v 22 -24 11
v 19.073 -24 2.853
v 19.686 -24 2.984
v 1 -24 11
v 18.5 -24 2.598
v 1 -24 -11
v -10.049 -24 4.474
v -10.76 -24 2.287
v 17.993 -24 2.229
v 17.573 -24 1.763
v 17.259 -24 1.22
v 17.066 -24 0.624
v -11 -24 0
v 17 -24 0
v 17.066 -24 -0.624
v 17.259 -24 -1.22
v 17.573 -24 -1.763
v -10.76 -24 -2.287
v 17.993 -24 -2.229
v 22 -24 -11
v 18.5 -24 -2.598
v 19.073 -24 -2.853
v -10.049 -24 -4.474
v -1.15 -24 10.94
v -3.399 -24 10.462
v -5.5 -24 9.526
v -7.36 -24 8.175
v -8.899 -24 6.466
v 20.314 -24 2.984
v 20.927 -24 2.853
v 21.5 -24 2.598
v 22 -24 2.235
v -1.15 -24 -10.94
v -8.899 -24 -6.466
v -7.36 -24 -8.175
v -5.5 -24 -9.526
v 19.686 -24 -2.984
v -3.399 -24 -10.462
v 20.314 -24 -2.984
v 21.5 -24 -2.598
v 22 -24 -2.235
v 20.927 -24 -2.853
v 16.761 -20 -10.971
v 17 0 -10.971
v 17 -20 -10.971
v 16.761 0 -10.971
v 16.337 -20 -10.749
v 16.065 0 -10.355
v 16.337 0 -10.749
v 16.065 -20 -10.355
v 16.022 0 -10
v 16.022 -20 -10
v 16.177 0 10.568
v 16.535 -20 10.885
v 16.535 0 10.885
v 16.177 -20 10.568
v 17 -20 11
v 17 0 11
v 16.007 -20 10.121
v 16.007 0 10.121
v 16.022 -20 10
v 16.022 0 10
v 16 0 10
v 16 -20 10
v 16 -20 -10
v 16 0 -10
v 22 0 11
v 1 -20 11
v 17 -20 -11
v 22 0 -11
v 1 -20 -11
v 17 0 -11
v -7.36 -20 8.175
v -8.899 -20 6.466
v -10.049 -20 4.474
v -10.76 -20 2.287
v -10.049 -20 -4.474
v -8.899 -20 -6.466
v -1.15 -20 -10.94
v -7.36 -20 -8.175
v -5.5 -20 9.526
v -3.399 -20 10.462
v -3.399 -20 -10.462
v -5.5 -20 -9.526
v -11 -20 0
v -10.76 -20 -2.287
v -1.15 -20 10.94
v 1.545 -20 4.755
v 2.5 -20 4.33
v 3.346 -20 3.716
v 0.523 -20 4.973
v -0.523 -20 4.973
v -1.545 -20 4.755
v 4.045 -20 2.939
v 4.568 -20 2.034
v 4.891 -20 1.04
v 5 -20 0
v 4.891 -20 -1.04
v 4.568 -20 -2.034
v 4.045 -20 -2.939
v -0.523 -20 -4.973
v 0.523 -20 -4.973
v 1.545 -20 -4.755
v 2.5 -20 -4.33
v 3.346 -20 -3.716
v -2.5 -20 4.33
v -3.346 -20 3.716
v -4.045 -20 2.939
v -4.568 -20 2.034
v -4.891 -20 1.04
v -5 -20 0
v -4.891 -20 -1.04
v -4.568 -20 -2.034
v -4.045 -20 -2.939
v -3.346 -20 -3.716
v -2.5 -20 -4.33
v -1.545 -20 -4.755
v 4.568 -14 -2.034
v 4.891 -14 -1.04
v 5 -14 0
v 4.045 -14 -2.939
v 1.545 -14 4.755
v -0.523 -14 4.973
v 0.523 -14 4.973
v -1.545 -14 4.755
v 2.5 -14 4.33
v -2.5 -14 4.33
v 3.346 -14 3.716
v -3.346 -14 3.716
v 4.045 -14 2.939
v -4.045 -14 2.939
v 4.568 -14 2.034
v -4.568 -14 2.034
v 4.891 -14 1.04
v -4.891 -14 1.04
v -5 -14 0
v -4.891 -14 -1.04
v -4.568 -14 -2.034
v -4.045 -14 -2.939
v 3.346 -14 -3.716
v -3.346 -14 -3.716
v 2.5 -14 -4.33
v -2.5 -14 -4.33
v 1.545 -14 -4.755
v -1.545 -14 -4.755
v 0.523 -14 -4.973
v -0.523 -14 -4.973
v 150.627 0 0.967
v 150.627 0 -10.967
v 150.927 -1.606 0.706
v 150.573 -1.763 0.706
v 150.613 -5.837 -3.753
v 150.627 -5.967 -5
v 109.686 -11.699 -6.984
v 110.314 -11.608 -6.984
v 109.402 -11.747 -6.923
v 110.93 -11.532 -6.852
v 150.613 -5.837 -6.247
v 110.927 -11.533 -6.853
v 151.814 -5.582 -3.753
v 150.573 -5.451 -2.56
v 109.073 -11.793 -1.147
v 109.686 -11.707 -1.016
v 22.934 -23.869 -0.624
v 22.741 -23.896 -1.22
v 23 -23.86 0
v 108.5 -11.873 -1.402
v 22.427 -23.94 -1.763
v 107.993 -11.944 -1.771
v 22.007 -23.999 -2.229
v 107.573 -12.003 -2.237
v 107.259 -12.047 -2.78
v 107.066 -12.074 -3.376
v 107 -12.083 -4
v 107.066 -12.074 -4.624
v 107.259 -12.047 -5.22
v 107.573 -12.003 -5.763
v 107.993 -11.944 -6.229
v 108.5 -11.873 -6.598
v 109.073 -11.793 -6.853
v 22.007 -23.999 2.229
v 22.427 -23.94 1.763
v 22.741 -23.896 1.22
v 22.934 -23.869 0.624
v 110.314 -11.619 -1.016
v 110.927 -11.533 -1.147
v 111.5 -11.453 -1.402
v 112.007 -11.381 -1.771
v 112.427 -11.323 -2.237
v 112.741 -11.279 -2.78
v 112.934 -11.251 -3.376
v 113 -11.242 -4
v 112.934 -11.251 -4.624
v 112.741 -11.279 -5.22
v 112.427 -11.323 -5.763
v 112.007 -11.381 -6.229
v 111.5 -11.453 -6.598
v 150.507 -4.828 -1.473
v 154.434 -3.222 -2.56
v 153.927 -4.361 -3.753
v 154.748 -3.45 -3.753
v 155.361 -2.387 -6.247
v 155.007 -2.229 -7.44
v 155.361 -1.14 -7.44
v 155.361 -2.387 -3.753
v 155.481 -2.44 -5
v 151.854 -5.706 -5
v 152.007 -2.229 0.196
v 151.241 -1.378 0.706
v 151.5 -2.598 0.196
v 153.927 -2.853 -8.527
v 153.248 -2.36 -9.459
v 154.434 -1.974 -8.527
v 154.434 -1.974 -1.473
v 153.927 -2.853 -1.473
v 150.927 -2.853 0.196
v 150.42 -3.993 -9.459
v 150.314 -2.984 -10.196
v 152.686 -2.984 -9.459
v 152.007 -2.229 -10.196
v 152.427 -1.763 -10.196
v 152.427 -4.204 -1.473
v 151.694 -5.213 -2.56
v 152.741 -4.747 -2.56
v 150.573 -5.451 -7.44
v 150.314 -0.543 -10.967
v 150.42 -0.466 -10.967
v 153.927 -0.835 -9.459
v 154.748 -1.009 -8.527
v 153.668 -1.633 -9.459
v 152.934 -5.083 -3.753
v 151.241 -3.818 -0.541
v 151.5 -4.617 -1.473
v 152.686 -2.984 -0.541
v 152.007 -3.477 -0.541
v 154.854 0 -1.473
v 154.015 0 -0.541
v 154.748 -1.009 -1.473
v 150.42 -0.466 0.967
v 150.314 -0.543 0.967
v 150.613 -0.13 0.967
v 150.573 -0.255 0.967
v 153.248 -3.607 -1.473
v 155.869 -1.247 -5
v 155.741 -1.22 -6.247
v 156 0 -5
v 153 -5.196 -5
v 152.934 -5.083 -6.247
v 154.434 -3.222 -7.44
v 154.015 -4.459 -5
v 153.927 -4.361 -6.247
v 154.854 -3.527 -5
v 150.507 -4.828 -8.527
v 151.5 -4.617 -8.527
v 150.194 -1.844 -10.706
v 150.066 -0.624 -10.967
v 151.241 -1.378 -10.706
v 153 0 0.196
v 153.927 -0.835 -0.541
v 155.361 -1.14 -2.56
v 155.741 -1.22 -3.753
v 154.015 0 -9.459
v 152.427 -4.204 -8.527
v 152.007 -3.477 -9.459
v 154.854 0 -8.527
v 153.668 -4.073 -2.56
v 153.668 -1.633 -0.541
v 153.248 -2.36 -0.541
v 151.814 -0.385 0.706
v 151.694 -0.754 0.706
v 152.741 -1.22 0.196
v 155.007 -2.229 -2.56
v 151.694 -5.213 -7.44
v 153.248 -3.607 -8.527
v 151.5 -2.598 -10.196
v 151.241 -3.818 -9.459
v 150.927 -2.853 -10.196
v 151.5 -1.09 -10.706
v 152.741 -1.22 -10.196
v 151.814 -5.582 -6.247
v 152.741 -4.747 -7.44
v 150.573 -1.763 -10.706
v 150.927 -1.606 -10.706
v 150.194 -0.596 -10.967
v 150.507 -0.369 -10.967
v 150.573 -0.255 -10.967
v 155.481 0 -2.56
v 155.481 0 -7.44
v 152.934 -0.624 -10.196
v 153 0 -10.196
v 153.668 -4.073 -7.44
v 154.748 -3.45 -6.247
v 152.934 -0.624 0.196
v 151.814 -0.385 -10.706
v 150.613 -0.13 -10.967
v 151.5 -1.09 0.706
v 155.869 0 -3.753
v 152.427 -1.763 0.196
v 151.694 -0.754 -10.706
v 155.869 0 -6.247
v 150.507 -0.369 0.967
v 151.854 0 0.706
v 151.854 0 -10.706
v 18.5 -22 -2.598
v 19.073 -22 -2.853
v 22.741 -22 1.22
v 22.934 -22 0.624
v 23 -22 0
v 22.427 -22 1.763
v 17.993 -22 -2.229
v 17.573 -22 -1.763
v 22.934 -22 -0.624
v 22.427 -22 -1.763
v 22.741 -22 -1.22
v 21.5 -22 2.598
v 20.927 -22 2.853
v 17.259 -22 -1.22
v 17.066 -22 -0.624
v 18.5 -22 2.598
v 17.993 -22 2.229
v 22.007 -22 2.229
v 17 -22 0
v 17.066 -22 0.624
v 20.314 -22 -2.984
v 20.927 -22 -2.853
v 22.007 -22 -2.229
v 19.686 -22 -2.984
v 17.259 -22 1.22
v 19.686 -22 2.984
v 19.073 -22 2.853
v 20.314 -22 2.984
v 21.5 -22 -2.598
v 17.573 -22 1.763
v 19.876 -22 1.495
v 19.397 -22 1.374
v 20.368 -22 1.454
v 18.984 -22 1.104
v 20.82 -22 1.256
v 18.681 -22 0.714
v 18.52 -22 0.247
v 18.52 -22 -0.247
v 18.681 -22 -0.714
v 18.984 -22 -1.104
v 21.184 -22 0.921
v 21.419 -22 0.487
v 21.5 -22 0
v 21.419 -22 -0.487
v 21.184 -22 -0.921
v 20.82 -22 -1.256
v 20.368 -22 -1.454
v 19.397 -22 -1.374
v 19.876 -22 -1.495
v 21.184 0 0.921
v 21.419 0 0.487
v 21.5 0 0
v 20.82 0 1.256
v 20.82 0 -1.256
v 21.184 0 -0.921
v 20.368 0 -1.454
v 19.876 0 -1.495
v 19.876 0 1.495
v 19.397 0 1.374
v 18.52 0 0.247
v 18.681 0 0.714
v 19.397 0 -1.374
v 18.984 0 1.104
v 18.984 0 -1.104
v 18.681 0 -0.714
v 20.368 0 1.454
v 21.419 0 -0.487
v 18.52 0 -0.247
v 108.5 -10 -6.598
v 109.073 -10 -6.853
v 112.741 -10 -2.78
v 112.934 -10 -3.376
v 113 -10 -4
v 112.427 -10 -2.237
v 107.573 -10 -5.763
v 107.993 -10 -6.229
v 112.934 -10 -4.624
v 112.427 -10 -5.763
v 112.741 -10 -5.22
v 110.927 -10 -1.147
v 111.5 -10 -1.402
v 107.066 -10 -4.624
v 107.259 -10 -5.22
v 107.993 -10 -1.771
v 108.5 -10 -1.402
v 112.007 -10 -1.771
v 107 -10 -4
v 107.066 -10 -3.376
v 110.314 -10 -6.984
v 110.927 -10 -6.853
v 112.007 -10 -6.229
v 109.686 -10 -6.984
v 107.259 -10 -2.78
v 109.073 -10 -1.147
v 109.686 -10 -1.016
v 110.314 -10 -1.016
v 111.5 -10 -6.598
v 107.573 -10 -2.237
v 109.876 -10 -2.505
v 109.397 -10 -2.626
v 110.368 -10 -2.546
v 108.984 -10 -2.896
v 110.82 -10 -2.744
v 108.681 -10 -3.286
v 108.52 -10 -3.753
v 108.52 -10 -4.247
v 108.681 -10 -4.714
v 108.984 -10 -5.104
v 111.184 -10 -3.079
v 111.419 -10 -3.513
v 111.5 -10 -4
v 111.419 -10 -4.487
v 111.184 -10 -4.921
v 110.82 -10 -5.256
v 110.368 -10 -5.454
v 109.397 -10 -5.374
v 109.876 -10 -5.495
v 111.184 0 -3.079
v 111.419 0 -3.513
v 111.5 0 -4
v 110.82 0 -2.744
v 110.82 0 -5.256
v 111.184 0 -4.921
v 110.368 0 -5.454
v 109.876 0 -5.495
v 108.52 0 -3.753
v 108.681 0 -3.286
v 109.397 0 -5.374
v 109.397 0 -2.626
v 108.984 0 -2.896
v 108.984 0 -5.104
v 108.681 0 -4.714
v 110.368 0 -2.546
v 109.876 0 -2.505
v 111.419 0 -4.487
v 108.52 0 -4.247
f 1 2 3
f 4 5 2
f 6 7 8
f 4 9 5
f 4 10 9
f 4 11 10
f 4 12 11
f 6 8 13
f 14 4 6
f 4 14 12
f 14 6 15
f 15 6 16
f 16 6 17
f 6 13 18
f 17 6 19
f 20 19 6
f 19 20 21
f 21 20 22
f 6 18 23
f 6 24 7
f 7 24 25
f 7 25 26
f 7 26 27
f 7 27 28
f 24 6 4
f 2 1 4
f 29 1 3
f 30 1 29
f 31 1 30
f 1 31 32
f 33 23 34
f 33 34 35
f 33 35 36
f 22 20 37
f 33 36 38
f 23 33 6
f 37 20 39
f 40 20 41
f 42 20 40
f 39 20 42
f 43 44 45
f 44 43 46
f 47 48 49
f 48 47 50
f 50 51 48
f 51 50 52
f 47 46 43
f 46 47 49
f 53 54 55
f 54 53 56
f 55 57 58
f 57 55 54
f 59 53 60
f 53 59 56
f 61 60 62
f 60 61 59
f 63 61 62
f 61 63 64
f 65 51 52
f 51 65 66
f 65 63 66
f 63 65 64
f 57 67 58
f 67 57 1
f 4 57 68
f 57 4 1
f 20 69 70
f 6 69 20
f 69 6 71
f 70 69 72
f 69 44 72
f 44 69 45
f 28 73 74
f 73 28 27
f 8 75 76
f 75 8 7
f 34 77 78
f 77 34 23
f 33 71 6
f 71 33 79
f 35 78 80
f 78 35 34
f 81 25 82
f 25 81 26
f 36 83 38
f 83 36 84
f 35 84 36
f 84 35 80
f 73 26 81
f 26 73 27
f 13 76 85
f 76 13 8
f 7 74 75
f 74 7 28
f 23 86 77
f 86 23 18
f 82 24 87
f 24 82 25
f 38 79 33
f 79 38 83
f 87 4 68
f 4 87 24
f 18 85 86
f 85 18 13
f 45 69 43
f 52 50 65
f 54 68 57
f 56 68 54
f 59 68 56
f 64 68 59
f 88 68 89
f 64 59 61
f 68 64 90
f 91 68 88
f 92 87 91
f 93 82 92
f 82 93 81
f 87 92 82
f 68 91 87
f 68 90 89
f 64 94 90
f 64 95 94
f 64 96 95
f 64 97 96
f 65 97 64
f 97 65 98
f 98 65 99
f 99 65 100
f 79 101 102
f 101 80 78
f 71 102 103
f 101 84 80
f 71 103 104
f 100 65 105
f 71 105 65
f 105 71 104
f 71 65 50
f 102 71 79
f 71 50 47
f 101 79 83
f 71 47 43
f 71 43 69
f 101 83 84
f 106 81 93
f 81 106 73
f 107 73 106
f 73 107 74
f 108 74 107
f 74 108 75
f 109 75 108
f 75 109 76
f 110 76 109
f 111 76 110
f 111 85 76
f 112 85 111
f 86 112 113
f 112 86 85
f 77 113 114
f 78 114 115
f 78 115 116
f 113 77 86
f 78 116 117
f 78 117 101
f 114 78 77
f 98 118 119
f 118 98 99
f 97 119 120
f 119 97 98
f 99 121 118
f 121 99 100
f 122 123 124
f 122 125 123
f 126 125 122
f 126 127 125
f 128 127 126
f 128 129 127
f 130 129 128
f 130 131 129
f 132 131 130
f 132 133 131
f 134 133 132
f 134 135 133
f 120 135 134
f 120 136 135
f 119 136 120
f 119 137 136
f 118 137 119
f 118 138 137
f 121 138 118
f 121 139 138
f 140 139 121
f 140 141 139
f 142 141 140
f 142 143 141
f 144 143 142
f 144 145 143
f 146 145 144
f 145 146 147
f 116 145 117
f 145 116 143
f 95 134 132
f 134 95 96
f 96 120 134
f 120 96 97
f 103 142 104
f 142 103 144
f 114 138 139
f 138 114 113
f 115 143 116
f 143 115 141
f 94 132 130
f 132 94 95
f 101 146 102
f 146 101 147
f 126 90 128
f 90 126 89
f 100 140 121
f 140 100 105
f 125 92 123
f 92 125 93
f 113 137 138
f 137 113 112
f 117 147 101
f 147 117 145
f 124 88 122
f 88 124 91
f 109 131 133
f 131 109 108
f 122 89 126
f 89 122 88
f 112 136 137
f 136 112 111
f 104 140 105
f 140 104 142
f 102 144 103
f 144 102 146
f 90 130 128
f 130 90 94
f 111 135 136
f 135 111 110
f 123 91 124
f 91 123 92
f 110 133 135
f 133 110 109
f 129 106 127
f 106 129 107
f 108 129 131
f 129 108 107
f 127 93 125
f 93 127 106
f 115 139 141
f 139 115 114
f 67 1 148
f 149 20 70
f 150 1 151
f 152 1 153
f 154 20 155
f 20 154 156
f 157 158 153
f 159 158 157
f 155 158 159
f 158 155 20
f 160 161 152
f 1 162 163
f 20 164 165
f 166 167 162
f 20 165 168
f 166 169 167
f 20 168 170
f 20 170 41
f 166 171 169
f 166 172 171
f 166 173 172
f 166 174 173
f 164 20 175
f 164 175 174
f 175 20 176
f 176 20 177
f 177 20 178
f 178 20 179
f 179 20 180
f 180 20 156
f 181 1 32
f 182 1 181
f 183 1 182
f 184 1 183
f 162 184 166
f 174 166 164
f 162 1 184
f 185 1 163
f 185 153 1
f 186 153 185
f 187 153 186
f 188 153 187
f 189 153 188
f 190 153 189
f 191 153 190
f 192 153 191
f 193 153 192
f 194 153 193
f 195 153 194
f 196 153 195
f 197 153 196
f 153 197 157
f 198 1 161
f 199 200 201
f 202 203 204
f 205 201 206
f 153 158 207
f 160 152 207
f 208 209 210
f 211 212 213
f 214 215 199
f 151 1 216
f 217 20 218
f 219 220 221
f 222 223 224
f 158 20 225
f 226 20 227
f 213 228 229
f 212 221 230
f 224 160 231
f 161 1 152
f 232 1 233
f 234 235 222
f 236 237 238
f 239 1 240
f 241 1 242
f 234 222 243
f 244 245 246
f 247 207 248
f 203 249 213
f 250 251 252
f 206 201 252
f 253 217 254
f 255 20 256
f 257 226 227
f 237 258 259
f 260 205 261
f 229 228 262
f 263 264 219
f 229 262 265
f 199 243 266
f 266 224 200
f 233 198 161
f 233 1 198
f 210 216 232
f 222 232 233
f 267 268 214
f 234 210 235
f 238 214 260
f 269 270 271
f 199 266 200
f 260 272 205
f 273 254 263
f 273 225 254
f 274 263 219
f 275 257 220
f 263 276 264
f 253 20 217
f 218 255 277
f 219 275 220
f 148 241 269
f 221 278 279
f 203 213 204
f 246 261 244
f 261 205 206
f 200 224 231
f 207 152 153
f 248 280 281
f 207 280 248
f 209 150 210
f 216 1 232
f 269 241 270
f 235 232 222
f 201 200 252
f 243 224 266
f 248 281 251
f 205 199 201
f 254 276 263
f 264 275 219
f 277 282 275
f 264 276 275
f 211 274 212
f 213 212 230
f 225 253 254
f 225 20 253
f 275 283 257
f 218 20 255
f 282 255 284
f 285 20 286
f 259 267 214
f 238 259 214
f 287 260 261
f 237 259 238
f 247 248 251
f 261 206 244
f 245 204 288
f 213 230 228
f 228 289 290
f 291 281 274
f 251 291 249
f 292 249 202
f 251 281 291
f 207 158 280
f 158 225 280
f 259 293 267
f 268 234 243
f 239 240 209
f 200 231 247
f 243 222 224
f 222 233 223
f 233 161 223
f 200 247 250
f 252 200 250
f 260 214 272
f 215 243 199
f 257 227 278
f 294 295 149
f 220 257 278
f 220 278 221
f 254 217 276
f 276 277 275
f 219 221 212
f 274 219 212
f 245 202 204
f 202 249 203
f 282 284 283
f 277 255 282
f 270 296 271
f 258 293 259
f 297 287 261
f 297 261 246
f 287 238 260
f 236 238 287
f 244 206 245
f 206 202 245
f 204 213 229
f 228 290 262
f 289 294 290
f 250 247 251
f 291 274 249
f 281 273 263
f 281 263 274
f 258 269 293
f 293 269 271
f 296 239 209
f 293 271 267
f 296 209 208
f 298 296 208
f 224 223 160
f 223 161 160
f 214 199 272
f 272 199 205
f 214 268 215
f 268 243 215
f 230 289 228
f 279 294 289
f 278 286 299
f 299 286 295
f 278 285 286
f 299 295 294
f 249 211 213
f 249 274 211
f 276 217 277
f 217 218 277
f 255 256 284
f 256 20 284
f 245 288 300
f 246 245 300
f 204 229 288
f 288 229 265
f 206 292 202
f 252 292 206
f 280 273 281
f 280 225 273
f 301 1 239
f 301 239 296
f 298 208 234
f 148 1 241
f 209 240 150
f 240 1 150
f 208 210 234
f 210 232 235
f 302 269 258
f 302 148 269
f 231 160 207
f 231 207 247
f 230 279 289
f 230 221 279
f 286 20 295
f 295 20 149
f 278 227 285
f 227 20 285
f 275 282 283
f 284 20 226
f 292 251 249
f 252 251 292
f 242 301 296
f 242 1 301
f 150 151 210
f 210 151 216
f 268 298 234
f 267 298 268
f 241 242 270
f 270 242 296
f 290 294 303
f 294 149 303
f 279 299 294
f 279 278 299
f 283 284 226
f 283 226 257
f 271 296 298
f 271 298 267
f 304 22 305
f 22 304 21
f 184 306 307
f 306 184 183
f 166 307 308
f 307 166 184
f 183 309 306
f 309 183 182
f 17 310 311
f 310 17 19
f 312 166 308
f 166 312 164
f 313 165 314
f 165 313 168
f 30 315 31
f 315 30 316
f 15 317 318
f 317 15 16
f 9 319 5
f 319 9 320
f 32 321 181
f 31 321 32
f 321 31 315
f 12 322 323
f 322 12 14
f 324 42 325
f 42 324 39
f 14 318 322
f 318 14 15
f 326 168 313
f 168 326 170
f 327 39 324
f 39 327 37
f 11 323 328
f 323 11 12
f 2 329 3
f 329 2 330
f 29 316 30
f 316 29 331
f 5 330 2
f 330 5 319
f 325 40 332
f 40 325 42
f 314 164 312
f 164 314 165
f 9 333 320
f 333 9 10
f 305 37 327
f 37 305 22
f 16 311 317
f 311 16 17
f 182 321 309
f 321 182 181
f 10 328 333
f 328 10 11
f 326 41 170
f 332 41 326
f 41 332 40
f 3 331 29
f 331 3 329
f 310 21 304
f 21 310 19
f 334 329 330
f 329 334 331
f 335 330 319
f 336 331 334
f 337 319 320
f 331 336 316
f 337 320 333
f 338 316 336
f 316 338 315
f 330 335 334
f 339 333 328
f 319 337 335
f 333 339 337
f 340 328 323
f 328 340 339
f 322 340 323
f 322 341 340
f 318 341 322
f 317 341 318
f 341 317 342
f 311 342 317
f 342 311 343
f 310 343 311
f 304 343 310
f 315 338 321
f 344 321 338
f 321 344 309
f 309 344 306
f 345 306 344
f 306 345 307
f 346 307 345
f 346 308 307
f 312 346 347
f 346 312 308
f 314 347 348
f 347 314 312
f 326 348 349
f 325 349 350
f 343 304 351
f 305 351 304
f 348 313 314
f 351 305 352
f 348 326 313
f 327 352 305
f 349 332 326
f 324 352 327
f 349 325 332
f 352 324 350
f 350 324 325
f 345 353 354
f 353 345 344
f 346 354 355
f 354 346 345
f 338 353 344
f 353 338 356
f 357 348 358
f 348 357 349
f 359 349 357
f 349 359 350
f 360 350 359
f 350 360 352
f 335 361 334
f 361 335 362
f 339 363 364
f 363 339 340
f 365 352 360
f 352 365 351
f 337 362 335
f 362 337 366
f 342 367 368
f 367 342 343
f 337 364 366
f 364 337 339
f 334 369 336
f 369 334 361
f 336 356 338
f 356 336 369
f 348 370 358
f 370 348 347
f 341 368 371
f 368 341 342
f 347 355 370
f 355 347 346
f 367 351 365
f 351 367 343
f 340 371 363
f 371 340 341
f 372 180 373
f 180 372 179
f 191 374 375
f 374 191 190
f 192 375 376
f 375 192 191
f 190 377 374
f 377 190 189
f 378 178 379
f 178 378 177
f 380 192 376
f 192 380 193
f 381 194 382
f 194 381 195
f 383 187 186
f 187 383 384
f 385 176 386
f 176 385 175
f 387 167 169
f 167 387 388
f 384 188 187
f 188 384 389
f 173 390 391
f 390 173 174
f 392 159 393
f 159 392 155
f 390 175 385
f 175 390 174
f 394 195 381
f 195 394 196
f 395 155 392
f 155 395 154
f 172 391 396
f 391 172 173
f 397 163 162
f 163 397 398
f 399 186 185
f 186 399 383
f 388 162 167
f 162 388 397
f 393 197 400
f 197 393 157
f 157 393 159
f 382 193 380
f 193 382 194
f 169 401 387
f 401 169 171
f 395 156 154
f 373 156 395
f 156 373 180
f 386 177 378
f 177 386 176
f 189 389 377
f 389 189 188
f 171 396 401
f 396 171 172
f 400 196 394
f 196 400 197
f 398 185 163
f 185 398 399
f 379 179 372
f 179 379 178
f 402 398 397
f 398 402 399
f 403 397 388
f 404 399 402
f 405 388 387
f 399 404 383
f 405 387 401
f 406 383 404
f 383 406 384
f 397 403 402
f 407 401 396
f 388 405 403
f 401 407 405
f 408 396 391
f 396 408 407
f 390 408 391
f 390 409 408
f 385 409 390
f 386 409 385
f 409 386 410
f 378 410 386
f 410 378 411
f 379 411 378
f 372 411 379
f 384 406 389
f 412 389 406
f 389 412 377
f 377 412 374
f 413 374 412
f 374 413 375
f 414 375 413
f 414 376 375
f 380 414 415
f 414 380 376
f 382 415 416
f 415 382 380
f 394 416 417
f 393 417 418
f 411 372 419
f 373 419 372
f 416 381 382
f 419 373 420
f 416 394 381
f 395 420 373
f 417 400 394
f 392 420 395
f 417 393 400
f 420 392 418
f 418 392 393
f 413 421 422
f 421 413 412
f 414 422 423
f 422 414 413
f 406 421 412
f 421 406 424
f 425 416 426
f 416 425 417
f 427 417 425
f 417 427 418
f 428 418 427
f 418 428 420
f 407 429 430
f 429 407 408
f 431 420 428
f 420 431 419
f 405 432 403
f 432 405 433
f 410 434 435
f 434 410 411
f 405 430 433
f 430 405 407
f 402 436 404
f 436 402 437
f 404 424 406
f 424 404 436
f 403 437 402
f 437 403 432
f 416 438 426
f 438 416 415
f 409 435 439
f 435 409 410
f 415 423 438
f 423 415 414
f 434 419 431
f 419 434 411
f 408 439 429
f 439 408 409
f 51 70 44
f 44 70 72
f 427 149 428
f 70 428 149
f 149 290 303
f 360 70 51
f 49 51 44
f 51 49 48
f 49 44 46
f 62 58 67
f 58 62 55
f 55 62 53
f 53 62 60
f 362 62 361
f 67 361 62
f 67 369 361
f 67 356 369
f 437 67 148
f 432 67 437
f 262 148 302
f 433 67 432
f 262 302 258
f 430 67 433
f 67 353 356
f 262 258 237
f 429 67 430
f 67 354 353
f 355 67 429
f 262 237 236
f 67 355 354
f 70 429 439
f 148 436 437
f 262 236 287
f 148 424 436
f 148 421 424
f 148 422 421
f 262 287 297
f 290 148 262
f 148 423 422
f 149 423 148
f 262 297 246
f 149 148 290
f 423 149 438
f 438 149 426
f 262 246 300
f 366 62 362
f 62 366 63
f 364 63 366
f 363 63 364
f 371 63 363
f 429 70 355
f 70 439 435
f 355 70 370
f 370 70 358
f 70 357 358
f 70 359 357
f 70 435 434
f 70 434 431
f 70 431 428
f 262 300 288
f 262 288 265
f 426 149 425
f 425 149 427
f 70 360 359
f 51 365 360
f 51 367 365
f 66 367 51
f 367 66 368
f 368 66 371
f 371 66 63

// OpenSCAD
// file: 9g_servo.scad
9g_motor();

module 9g_motor(){
	difference(){			
		union(){
			color("blue") cube([23,12.5,22], center=true);
			color("blue") translate([0,0,5]) cube([32,12,2], center=true);
			color("blue") translate([5.5,0,2.75]) cylinder(r=6, h=25.75, $fn=20, center=true);
			color("blue") translate([-.5,0,2.75]) cylinder(r=1, h=25.75, $fn=20, center=true);
			color("blue") translate([-1,0,2.75]) cube([5,5.6,24.5], center=true);		
			color("white") translate([5.5,0,3.65]) cylinder(r=2.35, h=29.25, $fn=20, center=true);				
		}
		translate([10,0,-11]) rotate([0,-30,0]) cube([8,13,4], center=true);
		for ( hole = [14,-14] ){
			translate([hole,0,5]) cylinder(r=2.2, h=4, $fn=20, center=true);
		}	
	}
}

module 24g_motor(){
	difference(){			
		union(){
			color("black") cube([30,16,30], center=true);
			color("black") translate([0,0,5]) cube([42,16,2], center=true);
			color("black") translate([5.5,0,2.75]) cylinder(r=6, h=25.75, $fn=20, center=true);
			color("black") translate([-.5,0,2.75]) cylinder(r=1, h=25.75, $fn=20, center=true);
			color("black") translate([-1,0,2.75]) cube([5,5.6,24.5], center=true);		
			color("gold") translate([5.5,0,3.65]) cylinder(r=2.35, h=29.25, $fn=20, center=true);				
		}
		translate([10,0,-11]) rotate([0,-30,0]) cube([8,13,4], center=true);
		for ( hole = [20,-20] ){
			translate([hole,4,5]) cylinder(r=2.2, h=4, $fn=20, center=true);
            translate([hole,-4,5]) cylinder(r=2.2, h=4, $fn=20, center=true);
		}	
	}
}
// file: barrel_joint.scad
use <9g_servo.scad>
use <MCAD/regular_shapes.scad>
use <MCAD/boxes.scad>
$fs = 0.5;
module barrel_joint(diameter, bearing_size) {
        difference() {
                hull() {
                    cylinder(d=diameter, h=38);
                    translate([-diameter/2,0,19])
                    cube([diameter, diameter, 38], center=true);
                }
                translate([0,0,-1])
                cylinder(d=bearing_size,h=6);
                translate([0,0,33])
                cylinder(d=bearing_size,h=6);
                translate([-5.5, 0,17])
                9g_motor();
                hull() {
                    translate([0,0,6])
                    cylinder(r=6,h=27);
                    translate([-20,0,19.6])
                    cube([20,13,28], center=true);
                    
                }
                translate([0,0,22])
                cube([diameter, 12.2, 2.2], center=true);
                translate([-16,0,2])
                rotate([0,-90,0])
                cylinder(d=3,h=8);
                translate([-16,0,36])
                rotate([0,-90,0])
                cylinder(d=3,h=8);
        }
        
}

module barrel_joint_split(diameter, bearing_size, inverse=false) {
    inversion = inverse ? -1 : 1;
    difference() {
         hull() {
            cylinder(d=diameter, h=38);
            translate([-diameter/2,0,19])
            cube([diameter, diameter, 38], center=true);
        }
        translate([0,0,-1])
        cylinder(d=bearing_size,h=6);
        translate([0,0,33])
        cylinder(d=bearing_size,h=6);
        translate([-5.5, 0,17])
        9g_motor();
        hull() {
            translate([0,0,6])
            cylinder(r=6,h=27);
            translate([-20,0,19.6])
            cube([20,13,28], center=true);
            
        }
        translate([0,0,22])
        cube([diameter, 12.2, 2.2], center=true);
        translate([0,20 * inversion,0])
        cube([50,40,80], center=true);
        
        translate([-16,20,2.5])
        rotate([90,0,0])
        cylinder(d=3,h=40);
        translate([-16,20,35.5])
        rotate([90,0,0])
        cylinder(d=3,h=40);
    }
}

module barrel_joint_attachment(diameter) {
     translate([0,0,-18]) {
                rotate([90,0,90])
                roundedBox(size=[diameter,4, 48], radius=1, sidesonly=true);
            }
            translate([-24,0,0])
            rotate([0,90,0]){
            hull() {
                translate([diameter/2,0,2])
                roundedBox(size=[diameter,diameter,4],radius=1, sidesonly=true);
                cylinder(d=diameter, h=4);
            }
            cylinder(h=10,r=5);
        }
            
            translate([24,0,0])
            rotate([180,90,0]){
            hull() {
                translate([diameter/2,0,2])
                roundedBox(size=[diameter,diameter,4],radius=1, sidesonly=true);
                cylinder(d = diameter, h=4);
            }
            cylinder(h=10,r=5);
        }
}

//barrel_joint_split(22,19);
//barrel_joint(22,19);
//translate([-5.5, 0,17])
//9g_motor();

barrel_joint_attachment(22,19);
// main file
use <barrel_joint.scad>

$fs=0.5;

module bolt_hole(width) {
    rotate([90,0,0]){
            translate([0,0,width/2-2])
            cylinder(r=3,h=50);
            translate([0,0,-width/2+2])
            rotate([180,0,0])
            cylinder(r=3,h=50);
        
            translate([0,0,-25])
            cylinder(r=1.5,h=50);
        }
    }

module tib_1_main(length=150, inverse = false) {
    inversion = inverse ? -1 : 1;
    difference(){
        union() {
            rotate([90,0,-90])
            barrel_joint_attachment(22);
            
            hull(){
                translate([20,0,0])
                cube([4,48,22],center=true);
                
                translate([length,0,-5])
                sphere(6);
            
            }
        }
        
        translate([20,0,0])
        bolt_hole(48);
        
        translate([length - 40,0,-4])
        bolt_hole(24);
        
        translate([length/2,20 * inversion,0])
        cube([length + 50,40,80], center=true);
        
    }
};

module tib_1(){
    tib_1_main();
    tib_1_main(inverse=true);
}

tib_1_main();
